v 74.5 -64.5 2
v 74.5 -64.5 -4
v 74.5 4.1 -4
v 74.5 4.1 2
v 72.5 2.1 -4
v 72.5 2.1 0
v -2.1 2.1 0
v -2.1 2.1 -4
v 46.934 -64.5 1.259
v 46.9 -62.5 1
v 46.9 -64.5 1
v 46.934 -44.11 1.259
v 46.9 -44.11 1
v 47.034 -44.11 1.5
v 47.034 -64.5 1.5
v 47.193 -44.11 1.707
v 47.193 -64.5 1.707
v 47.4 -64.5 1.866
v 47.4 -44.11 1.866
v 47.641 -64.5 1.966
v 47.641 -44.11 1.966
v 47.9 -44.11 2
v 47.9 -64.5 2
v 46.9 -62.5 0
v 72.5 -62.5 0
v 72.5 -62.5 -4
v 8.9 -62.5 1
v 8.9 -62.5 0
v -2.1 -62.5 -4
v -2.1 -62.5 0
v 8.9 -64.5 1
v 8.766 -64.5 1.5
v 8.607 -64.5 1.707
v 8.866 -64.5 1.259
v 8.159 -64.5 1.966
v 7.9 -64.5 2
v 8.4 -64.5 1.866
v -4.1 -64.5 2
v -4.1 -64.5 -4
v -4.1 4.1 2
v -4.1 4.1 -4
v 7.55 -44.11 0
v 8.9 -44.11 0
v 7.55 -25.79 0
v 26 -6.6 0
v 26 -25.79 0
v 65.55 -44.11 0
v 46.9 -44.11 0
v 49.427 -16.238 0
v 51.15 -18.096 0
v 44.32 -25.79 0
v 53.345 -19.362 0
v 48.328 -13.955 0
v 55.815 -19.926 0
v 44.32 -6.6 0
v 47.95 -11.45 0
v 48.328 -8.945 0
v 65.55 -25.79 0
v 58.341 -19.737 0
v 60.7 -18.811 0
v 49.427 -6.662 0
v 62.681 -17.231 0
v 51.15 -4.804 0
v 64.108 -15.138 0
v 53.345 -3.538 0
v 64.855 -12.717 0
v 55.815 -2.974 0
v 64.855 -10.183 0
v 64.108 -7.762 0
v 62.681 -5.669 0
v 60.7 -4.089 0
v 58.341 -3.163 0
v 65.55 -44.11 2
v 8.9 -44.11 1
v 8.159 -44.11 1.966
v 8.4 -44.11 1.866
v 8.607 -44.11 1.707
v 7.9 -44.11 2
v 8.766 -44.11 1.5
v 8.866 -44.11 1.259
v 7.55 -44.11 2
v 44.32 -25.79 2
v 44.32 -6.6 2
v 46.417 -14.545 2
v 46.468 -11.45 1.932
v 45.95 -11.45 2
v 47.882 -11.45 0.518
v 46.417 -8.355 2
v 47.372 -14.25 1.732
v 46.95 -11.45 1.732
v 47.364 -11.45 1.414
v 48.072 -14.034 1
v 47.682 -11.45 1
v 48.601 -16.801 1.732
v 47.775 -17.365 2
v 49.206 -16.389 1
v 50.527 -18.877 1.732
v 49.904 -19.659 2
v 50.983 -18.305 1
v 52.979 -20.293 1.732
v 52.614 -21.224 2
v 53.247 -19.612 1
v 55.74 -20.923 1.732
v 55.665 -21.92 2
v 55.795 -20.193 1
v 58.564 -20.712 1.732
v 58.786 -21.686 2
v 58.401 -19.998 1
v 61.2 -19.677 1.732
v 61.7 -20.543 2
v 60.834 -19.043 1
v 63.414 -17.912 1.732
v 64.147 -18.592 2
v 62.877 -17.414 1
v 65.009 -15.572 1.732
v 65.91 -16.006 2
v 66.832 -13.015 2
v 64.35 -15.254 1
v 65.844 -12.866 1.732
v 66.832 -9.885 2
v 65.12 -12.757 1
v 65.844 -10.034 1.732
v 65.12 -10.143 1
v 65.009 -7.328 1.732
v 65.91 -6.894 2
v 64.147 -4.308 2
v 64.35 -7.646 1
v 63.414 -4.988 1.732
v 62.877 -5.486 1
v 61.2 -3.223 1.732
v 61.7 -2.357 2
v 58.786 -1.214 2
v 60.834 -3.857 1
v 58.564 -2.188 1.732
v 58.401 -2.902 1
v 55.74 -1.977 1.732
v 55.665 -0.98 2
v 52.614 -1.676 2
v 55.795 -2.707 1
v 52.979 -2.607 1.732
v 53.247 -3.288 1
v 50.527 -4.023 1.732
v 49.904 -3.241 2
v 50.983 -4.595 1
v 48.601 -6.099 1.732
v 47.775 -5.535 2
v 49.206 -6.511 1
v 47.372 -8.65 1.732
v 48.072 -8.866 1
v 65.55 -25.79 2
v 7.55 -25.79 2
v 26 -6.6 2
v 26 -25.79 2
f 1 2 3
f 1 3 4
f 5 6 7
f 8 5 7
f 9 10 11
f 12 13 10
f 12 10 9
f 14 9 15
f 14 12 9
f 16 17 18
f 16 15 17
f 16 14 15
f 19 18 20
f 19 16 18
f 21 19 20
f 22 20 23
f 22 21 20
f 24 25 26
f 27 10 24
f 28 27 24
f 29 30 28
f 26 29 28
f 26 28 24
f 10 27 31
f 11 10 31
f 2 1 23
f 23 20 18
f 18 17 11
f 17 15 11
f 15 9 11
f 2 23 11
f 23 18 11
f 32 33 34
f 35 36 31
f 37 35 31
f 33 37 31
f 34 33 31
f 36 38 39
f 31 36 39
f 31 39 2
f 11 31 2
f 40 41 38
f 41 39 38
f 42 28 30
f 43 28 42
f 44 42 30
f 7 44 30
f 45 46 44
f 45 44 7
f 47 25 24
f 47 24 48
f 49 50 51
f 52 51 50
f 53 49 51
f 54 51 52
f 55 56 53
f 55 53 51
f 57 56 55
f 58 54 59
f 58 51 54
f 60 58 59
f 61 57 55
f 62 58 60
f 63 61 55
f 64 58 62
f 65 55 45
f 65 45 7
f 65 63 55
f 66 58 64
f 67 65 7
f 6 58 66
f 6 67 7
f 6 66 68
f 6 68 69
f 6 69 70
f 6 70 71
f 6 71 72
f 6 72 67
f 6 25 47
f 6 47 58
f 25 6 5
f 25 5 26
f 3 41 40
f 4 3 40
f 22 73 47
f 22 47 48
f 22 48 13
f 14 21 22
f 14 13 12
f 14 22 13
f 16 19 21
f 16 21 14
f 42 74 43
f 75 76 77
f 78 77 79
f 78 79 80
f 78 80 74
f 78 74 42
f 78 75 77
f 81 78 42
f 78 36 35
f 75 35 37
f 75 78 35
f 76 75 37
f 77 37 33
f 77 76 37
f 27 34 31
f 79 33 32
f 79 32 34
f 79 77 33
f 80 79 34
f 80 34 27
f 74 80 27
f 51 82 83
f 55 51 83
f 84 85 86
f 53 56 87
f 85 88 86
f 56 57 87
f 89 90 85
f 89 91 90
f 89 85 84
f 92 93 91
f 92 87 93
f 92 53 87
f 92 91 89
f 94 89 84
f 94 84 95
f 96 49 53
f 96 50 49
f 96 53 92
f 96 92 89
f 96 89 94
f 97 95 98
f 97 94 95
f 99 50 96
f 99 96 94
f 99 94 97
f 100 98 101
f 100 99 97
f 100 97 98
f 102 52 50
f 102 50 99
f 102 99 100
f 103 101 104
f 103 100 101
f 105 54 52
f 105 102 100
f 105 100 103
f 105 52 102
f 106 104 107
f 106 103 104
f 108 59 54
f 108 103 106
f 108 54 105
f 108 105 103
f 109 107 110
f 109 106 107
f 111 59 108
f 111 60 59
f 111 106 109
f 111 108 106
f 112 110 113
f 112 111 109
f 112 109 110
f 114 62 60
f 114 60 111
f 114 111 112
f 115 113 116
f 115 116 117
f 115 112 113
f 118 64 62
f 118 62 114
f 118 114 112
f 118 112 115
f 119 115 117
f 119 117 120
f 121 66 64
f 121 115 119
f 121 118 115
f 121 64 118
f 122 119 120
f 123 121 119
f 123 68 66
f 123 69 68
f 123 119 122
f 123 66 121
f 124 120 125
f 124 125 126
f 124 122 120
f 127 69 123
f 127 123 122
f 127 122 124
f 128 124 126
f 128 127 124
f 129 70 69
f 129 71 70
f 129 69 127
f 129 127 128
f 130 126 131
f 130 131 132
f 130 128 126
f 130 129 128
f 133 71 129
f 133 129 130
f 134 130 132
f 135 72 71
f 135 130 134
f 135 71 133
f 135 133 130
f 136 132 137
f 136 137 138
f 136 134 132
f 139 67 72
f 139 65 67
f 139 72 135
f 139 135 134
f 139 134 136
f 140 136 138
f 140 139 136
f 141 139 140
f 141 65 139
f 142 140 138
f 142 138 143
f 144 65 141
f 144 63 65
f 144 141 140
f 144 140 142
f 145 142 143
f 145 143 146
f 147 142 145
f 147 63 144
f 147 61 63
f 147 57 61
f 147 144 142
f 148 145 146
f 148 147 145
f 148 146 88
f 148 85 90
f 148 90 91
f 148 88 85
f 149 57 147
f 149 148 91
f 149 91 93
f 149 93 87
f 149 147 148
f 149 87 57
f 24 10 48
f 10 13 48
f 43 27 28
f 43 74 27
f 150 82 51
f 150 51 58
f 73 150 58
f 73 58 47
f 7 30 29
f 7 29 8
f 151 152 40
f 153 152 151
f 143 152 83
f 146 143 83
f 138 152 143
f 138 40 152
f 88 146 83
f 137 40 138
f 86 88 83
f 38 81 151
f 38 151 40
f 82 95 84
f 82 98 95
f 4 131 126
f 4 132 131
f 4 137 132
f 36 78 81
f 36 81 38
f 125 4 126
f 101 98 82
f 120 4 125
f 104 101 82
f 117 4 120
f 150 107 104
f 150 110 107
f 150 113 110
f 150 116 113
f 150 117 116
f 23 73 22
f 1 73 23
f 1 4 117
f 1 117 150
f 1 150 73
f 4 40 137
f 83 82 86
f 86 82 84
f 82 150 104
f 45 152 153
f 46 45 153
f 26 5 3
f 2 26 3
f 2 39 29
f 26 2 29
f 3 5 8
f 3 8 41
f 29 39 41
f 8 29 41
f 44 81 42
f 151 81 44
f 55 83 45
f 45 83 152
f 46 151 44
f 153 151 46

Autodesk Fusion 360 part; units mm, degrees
sketch "Sketch1" plane through (0, 0, 0) normal (0, 0, 1) x (1, 0, 0)
  line L0 (0, 0) -> (70.4, 0)
  line L1 (70.4, 0) -> (70.4, -60.4)
  line L2 (70.4, -60.4) -> (0, -60.4)
  line L3 (0, -60.4) -> (0, 0)
  dimension "d1" = 60.4
  dimension "d2" = 70.4
extrude "Extrude1" add sketch "Sketch1" along normal blind 2
sketch "Sketch3" plane through (0, 0, 2) normal (0, 0, 1) x (-1, 0, 0)
  line L0 (0, 60.4) -> (-70.4, 60.4)
  line L1 (-70.4, 60.4) -> (-70.4, 0)
  line L2 (-70.4, 0) -> (0, 0)
  line L3 (0, 0) -> (0, 60.4)
  line L4 (-7.55, 25.79) -> (-65.55, 25.79)
  line L5 (-65.55, 25.79) -> (-65.55, 44.11)
  line L6 (-65.55, 44.11) -> (-7.55, 44.11)
  line L7 (-7.55, 44.11) -> (-7.55, 25.79)
  line L8 (-26, 25.79) -> (-44.32, 25.79)
  line L9 (-44.32, 25.79) -> (-44.32, 6.6)
  line L10 (-44.32, 6.6) -> (-26, 6.6)
  line L11 (-26, 6.6) -> (-26, 25.79)
  line L12 (-46.9, 60.4) -> (-8.9, 60.4)
  line L13 (-8.9, 60.4) -> (-8.9, 44.11)
  line L14 (-8.9, 44.11) -> (-46.9, 44.11)
  line L15 (-46.9, 44.11) -> (-46.9, 60.4)
  dimension "d19" = 58
  dimension "d20" = 18.32
  dimension "d21" = 7.55
  dimension "d22" = 70.4
  dimension "d23" = 18.32
  dimension "d24" = 19.19
  dimension "d25" = 6.6
  dimension "d26" = 26
  dimension "d27" = 16.29
  dimension "d28" = 38
  dimension "d29" = 8.9
extrude "Extrude2" cut sketch "Sketch3" against normal blind 2 contours L0 L6 L12 L13 L14 L15 | L4 L5 L6 L7 L8 L14 | L4 L8 L9 L10 L11
sketch "Sketch4" plane through (0, 0, 2) normal (0, 0, 1) x (-1, 0, 0)
  line L0 (-46.9, 44.11) -> (-46.9, 60.4)
  line L1 (-46.9, 60.4) -> (-70.4, 60.4)
  line L2 (-70.4, 60.4) -> (-70.4, 0)
  line L3 (-70.4, 0) -> (0, 0)
  line L4 (0, 0) -> (0, 60.4)
  line L5 (0, 60.4) -> (-8.9, 60.4)
  line L6 (-8.9, 60.4) -> (-8.9, 44.11)
  line L7 (-8.9, 44.11) -> (-7.55, 44.11)
  line L8 (-7.55, 44.11) -> (-7.55, 25.79)
  line L9 (-7.55, 25.79) -> (-26, 25.79)
  line L10 (-26, 25.79) -> (-26, 6.6)
  line L11 (-26, 6.6) -> (-44.32, 6.6)
  line L12 (-44.32, 6.6) -> (-44.32, 25.79)
  line L13 (-44.32, 25.79) -> (-65.55, 25.79)
  line L14 (-65.55, 25.79) -> (-65.55, 44.11)
  line L15 (-65.55, 44.11) -> (-46.9, 44.11)
  circle A0 centre (-56.45, 11.45) radius 8.5
  dimension "d32" = 17
  dimension "d33" = 13.95
  dimension "d34" = 11.45
extrude "Extrude3" cut sketch "Sketch4" against normal blind 2 contours A0
fillet "Fillet1" radius 1 2 edges at (8.9, -52.255, 2) (46.9, -52.255, 2)
fillet "Fillet2" radius 2 1 edges at (64.3748, -14.5237, 2)
extrude "Extrude4" add 1 faces at (55.0667, -60.4, 0.6667) along direction (0, -1, 0) blind 2
extrude "Extrude5" add 1 faces at (5.6, -60.4, 0.6667) along direction (0, -1, 0) blind 2
extrude "Extrude6" add 1 faces at (0, -41.6, 1.3333) along direction (-1, 0, 0) blind 2
extrude "Extrude7" add 1 faces at (46.2667, 0, 0.6667) along direction (0, 1, 0) blind 2
extrude "Extrude13" add 1 faces at (70.4, -40.9333, 0.6667) along direction (1, 0, 0) blind 2
extrude "Extrude14" add 2 faces at (4.9333, -62.4, 0.6667) (55.7333, -62.4, 0.6667) along direction (0, -1, 0) blind 2.1
extrude "Extrude15" add 1 faces at (72.4, -42.3333, 0.6667) along direction (1, 0, 0) blind 2.1
extrude "Extrude16" add 1 faces at (49, 2, 1.3333) along direction (0, 1, 0) blind 2.1
extrude "Extrude17" add 1 faces at (-2, -18.7667, 1.3333) along direction (-1, 0, 0) blind 2.1
sketch "Sketch6" plane through (0, 0, 0) normal (0, 0, -1) x (1, 0, 0)
  circle A0 centre (56.45, 11.45) radius 8.5
  line L0 (46.9, 64.5) -> (46.9, 44.11)
  line L1 (46.9, 44.11) -> (65.55, 44.11)
  line L2 (65.55, 44.11) -> (65.55, 25.79)
  line L3 (65.55, 25.79) -> (44.32, 25.79)
  line L4 (44.32, 25.79) -> (44.32, 6.6)
  line L5 (44.32, 6.6) -> (26, 6.6)
  line L6 (26, 6.6) -> (26, 25.79)
  line L7 (26, 25.79) -> (7.55, 25.79)
  line L8 (7.55, 25.79) -> (7.55, 44.11)
  line L9 (7.55, 44.11) -> (8.9, 44.11)
  line L10 (8.9, 44.11) -> (8.9, 64.5)
  line L11 (8.9, 64.5) -> (-4.1, 64.5)
  line L12 (-4.1, 64.5) -> (-4.1, -4.1)
  line L13 (-4.1, -4.1) -> (74.5, -4.1)
  line L14 (74.5, -4.1) -> (74.5, 64.5)
  line L15 (74.5, 64.5) -> (46.9, 64.5)
  line L16 (-4.1, -4.1) -> (74.5, -4.1)
  line L17 (74.5, -4.1) -> (74.5, -2.1)
  line L18 (74.5, -2.1) -> (-4.1, -2.1)
  line L19 (-4.1, -2.1) -> (-4.1, -4.1)
  line L20 (74.5, -4.1) -> (72.5, -4.1)
  line L21 (72.5, -4.1) -> (72.5, 64.5)
  line L22 (72.5, 64.5) -> (74.5, 64.5)
  line L23 (74.5, 64.5) -> (74.5, -4.1)
  line L24 (-4.1, 64.5) -> (-2.1, 64.5)
  line L25 (-2.1, 64.5) -> (-2.1, -4.1)
  line L26 (-2.1, -4.1) -> (-4.1, -4.1)
  line L27 (-4.1, -4.1) -> (-4.1, 64.5)
  line L28 (-4.1, 64.5) -> (8.9, 64.5)
  line L29 (8.9, 64.5) -> (8.9, 62.5)
  line L30 (8.9, 62.5) -> (-4.1, 62.5)
  line L31 (-4.1, 62.5) -> (-4.1, 64.5)
  line L32 (46.9, 64.5) -> (74.5, 64.5)
  line L33 (74.5, 64.5) -> (74.5, 62.5)
  line L34 (74.5, 62.5) -> (46.9, 62.5)
  line L35 (46.9, 62.5) -> (46.9, 64.5)
  dimension "d69" = 2
  dimension "d70" = 2
  dimension "d71" = 2
  dimension "d72" = 2
  dimension "d73" = 2
extrude "Extrude18" add sketch "Sketch6" along normal blind 4 contours L0 L15 L21 L32 L34 L35 | L14 L15 L21 L22 L23 L32 L33 L34 | L14 L18 L21 L23 L34 | L13 L16 L18 L21 L25 | L13 L14 L16 L17 L18 L20 L21 L23 | L12 L13 L16 L18 L19 L25 L26 L27 | L12 L18 L25 L27 L30 | L11 L12 L24 L25 L27 L28 L30 L31 | L10 L11 L25 L28 L29 L30
sketch "Sketch7" plane through (8.9, 0, 0) normal (1, 0, 0) x (0, 1, 0)
  line L0 (-44.11, 1) -> (-64.5, 1)
  line L1 (-64.5, 1) -> (-64.5, -4)
  line L2 (-64.5, -4) -> (-62.5, -4)
  line L3 (-62.5, -4) -> (-62.5, 0)
  line L4 (-62.5, 0) -> (-44.11, 0)
  line L5 (-44.11, 0) -> (-44.11, 1)
  line L6 (-62.5, -4) -> (-64.5, -4)
  line L7 (-64.5, -4) -> (-64.5, 1)
  line L8 (-64.5, 1) -> (-62.5, 1)
  line L9 (-62.5, 1) -> (-62.5, -4)
extrude "Extrude19" add sketch "Sketch7" along normal blind 38 contours L0 L1 L2 L3 L6 L7 L8 L9
